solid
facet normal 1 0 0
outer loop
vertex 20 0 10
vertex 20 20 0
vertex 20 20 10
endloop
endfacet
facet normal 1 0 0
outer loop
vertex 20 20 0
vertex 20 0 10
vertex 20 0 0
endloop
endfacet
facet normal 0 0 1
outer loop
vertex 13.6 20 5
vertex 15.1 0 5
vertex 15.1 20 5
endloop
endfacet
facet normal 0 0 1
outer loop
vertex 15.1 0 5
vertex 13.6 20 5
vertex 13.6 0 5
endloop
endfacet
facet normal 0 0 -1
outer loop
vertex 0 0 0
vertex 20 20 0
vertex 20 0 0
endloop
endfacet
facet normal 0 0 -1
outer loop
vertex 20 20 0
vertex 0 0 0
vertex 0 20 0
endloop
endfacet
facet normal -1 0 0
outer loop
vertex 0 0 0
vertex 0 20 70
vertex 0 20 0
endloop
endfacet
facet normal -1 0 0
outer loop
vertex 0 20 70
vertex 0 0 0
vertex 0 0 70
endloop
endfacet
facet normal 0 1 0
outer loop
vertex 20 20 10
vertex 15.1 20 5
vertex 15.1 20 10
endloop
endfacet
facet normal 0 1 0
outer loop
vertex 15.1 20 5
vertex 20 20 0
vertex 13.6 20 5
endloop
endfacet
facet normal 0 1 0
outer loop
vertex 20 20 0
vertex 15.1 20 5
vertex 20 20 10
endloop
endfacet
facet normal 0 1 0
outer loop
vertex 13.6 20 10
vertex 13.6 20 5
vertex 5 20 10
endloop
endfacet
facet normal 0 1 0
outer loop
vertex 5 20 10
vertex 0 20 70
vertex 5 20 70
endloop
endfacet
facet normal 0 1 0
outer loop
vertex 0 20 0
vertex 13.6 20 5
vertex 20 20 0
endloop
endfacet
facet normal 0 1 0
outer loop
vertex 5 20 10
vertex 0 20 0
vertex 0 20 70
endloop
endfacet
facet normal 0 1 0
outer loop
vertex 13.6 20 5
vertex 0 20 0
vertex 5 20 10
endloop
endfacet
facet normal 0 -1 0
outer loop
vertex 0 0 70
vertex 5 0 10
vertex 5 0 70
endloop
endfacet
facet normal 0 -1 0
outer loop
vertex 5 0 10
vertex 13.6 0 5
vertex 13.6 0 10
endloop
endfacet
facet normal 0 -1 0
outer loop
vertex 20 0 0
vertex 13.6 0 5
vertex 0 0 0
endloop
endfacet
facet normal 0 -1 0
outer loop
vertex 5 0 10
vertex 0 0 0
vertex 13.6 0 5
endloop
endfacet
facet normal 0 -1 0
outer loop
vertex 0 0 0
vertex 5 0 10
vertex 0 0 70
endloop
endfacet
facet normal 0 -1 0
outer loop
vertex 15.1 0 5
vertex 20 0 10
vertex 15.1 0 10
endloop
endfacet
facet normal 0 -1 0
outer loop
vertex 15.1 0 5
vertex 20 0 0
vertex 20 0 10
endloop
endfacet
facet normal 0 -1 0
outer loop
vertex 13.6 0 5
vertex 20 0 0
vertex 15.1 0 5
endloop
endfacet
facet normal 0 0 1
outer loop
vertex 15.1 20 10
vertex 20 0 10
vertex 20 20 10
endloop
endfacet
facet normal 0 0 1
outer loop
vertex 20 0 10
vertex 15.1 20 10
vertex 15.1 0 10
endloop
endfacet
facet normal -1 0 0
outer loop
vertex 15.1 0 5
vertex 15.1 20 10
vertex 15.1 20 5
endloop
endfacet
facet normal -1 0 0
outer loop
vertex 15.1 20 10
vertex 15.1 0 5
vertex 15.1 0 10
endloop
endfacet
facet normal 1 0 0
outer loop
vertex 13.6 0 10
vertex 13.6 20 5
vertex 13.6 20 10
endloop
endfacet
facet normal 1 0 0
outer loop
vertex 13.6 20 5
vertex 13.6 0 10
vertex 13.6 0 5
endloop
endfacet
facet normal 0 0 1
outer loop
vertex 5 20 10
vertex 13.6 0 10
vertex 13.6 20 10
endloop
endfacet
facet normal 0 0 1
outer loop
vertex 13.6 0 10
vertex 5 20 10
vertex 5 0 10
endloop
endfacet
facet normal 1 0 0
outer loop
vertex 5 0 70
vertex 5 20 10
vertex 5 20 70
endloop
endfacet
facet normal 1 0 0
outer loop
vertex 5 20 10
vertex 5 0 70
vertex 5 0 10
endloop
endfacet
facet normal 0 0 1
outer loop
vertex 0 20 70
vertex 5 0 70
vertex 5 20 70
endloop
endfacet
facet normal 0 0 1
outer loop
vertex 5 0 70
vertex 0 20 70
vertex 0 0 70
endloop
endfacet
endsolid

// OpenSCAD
board_width = 20;
board_depth = 1.50;
stand_height = 20;
stand_width = board_width;
stand_depth = 10;

base_length = 70;
base_height = 5;

// 8.6 green or 10.1 blue
component_height = 8.6;
// component_height = 10.1;
notch_offset = component_height + base_height;
notch_depth = 5;

module pb_stand() {
    // verticle back
    translate([0,0,0])
        cube([stand_height,stand_width,stand_depth-notch_depth]);
    // verticle top
    translate([notch_offset+board_depth,0,0])
        cube([stand_height-notch_offset-board_depth,stand_width,stand_depth]);
    // verticle bottom 
    translate([0,0,0])
        cube([notch_offset,stand_width,stand_depth]);
    // horizontal base
    cube([base_height,stand_width,base_length]);
    
    // x -> z, z -> x
}

pb_stand();
